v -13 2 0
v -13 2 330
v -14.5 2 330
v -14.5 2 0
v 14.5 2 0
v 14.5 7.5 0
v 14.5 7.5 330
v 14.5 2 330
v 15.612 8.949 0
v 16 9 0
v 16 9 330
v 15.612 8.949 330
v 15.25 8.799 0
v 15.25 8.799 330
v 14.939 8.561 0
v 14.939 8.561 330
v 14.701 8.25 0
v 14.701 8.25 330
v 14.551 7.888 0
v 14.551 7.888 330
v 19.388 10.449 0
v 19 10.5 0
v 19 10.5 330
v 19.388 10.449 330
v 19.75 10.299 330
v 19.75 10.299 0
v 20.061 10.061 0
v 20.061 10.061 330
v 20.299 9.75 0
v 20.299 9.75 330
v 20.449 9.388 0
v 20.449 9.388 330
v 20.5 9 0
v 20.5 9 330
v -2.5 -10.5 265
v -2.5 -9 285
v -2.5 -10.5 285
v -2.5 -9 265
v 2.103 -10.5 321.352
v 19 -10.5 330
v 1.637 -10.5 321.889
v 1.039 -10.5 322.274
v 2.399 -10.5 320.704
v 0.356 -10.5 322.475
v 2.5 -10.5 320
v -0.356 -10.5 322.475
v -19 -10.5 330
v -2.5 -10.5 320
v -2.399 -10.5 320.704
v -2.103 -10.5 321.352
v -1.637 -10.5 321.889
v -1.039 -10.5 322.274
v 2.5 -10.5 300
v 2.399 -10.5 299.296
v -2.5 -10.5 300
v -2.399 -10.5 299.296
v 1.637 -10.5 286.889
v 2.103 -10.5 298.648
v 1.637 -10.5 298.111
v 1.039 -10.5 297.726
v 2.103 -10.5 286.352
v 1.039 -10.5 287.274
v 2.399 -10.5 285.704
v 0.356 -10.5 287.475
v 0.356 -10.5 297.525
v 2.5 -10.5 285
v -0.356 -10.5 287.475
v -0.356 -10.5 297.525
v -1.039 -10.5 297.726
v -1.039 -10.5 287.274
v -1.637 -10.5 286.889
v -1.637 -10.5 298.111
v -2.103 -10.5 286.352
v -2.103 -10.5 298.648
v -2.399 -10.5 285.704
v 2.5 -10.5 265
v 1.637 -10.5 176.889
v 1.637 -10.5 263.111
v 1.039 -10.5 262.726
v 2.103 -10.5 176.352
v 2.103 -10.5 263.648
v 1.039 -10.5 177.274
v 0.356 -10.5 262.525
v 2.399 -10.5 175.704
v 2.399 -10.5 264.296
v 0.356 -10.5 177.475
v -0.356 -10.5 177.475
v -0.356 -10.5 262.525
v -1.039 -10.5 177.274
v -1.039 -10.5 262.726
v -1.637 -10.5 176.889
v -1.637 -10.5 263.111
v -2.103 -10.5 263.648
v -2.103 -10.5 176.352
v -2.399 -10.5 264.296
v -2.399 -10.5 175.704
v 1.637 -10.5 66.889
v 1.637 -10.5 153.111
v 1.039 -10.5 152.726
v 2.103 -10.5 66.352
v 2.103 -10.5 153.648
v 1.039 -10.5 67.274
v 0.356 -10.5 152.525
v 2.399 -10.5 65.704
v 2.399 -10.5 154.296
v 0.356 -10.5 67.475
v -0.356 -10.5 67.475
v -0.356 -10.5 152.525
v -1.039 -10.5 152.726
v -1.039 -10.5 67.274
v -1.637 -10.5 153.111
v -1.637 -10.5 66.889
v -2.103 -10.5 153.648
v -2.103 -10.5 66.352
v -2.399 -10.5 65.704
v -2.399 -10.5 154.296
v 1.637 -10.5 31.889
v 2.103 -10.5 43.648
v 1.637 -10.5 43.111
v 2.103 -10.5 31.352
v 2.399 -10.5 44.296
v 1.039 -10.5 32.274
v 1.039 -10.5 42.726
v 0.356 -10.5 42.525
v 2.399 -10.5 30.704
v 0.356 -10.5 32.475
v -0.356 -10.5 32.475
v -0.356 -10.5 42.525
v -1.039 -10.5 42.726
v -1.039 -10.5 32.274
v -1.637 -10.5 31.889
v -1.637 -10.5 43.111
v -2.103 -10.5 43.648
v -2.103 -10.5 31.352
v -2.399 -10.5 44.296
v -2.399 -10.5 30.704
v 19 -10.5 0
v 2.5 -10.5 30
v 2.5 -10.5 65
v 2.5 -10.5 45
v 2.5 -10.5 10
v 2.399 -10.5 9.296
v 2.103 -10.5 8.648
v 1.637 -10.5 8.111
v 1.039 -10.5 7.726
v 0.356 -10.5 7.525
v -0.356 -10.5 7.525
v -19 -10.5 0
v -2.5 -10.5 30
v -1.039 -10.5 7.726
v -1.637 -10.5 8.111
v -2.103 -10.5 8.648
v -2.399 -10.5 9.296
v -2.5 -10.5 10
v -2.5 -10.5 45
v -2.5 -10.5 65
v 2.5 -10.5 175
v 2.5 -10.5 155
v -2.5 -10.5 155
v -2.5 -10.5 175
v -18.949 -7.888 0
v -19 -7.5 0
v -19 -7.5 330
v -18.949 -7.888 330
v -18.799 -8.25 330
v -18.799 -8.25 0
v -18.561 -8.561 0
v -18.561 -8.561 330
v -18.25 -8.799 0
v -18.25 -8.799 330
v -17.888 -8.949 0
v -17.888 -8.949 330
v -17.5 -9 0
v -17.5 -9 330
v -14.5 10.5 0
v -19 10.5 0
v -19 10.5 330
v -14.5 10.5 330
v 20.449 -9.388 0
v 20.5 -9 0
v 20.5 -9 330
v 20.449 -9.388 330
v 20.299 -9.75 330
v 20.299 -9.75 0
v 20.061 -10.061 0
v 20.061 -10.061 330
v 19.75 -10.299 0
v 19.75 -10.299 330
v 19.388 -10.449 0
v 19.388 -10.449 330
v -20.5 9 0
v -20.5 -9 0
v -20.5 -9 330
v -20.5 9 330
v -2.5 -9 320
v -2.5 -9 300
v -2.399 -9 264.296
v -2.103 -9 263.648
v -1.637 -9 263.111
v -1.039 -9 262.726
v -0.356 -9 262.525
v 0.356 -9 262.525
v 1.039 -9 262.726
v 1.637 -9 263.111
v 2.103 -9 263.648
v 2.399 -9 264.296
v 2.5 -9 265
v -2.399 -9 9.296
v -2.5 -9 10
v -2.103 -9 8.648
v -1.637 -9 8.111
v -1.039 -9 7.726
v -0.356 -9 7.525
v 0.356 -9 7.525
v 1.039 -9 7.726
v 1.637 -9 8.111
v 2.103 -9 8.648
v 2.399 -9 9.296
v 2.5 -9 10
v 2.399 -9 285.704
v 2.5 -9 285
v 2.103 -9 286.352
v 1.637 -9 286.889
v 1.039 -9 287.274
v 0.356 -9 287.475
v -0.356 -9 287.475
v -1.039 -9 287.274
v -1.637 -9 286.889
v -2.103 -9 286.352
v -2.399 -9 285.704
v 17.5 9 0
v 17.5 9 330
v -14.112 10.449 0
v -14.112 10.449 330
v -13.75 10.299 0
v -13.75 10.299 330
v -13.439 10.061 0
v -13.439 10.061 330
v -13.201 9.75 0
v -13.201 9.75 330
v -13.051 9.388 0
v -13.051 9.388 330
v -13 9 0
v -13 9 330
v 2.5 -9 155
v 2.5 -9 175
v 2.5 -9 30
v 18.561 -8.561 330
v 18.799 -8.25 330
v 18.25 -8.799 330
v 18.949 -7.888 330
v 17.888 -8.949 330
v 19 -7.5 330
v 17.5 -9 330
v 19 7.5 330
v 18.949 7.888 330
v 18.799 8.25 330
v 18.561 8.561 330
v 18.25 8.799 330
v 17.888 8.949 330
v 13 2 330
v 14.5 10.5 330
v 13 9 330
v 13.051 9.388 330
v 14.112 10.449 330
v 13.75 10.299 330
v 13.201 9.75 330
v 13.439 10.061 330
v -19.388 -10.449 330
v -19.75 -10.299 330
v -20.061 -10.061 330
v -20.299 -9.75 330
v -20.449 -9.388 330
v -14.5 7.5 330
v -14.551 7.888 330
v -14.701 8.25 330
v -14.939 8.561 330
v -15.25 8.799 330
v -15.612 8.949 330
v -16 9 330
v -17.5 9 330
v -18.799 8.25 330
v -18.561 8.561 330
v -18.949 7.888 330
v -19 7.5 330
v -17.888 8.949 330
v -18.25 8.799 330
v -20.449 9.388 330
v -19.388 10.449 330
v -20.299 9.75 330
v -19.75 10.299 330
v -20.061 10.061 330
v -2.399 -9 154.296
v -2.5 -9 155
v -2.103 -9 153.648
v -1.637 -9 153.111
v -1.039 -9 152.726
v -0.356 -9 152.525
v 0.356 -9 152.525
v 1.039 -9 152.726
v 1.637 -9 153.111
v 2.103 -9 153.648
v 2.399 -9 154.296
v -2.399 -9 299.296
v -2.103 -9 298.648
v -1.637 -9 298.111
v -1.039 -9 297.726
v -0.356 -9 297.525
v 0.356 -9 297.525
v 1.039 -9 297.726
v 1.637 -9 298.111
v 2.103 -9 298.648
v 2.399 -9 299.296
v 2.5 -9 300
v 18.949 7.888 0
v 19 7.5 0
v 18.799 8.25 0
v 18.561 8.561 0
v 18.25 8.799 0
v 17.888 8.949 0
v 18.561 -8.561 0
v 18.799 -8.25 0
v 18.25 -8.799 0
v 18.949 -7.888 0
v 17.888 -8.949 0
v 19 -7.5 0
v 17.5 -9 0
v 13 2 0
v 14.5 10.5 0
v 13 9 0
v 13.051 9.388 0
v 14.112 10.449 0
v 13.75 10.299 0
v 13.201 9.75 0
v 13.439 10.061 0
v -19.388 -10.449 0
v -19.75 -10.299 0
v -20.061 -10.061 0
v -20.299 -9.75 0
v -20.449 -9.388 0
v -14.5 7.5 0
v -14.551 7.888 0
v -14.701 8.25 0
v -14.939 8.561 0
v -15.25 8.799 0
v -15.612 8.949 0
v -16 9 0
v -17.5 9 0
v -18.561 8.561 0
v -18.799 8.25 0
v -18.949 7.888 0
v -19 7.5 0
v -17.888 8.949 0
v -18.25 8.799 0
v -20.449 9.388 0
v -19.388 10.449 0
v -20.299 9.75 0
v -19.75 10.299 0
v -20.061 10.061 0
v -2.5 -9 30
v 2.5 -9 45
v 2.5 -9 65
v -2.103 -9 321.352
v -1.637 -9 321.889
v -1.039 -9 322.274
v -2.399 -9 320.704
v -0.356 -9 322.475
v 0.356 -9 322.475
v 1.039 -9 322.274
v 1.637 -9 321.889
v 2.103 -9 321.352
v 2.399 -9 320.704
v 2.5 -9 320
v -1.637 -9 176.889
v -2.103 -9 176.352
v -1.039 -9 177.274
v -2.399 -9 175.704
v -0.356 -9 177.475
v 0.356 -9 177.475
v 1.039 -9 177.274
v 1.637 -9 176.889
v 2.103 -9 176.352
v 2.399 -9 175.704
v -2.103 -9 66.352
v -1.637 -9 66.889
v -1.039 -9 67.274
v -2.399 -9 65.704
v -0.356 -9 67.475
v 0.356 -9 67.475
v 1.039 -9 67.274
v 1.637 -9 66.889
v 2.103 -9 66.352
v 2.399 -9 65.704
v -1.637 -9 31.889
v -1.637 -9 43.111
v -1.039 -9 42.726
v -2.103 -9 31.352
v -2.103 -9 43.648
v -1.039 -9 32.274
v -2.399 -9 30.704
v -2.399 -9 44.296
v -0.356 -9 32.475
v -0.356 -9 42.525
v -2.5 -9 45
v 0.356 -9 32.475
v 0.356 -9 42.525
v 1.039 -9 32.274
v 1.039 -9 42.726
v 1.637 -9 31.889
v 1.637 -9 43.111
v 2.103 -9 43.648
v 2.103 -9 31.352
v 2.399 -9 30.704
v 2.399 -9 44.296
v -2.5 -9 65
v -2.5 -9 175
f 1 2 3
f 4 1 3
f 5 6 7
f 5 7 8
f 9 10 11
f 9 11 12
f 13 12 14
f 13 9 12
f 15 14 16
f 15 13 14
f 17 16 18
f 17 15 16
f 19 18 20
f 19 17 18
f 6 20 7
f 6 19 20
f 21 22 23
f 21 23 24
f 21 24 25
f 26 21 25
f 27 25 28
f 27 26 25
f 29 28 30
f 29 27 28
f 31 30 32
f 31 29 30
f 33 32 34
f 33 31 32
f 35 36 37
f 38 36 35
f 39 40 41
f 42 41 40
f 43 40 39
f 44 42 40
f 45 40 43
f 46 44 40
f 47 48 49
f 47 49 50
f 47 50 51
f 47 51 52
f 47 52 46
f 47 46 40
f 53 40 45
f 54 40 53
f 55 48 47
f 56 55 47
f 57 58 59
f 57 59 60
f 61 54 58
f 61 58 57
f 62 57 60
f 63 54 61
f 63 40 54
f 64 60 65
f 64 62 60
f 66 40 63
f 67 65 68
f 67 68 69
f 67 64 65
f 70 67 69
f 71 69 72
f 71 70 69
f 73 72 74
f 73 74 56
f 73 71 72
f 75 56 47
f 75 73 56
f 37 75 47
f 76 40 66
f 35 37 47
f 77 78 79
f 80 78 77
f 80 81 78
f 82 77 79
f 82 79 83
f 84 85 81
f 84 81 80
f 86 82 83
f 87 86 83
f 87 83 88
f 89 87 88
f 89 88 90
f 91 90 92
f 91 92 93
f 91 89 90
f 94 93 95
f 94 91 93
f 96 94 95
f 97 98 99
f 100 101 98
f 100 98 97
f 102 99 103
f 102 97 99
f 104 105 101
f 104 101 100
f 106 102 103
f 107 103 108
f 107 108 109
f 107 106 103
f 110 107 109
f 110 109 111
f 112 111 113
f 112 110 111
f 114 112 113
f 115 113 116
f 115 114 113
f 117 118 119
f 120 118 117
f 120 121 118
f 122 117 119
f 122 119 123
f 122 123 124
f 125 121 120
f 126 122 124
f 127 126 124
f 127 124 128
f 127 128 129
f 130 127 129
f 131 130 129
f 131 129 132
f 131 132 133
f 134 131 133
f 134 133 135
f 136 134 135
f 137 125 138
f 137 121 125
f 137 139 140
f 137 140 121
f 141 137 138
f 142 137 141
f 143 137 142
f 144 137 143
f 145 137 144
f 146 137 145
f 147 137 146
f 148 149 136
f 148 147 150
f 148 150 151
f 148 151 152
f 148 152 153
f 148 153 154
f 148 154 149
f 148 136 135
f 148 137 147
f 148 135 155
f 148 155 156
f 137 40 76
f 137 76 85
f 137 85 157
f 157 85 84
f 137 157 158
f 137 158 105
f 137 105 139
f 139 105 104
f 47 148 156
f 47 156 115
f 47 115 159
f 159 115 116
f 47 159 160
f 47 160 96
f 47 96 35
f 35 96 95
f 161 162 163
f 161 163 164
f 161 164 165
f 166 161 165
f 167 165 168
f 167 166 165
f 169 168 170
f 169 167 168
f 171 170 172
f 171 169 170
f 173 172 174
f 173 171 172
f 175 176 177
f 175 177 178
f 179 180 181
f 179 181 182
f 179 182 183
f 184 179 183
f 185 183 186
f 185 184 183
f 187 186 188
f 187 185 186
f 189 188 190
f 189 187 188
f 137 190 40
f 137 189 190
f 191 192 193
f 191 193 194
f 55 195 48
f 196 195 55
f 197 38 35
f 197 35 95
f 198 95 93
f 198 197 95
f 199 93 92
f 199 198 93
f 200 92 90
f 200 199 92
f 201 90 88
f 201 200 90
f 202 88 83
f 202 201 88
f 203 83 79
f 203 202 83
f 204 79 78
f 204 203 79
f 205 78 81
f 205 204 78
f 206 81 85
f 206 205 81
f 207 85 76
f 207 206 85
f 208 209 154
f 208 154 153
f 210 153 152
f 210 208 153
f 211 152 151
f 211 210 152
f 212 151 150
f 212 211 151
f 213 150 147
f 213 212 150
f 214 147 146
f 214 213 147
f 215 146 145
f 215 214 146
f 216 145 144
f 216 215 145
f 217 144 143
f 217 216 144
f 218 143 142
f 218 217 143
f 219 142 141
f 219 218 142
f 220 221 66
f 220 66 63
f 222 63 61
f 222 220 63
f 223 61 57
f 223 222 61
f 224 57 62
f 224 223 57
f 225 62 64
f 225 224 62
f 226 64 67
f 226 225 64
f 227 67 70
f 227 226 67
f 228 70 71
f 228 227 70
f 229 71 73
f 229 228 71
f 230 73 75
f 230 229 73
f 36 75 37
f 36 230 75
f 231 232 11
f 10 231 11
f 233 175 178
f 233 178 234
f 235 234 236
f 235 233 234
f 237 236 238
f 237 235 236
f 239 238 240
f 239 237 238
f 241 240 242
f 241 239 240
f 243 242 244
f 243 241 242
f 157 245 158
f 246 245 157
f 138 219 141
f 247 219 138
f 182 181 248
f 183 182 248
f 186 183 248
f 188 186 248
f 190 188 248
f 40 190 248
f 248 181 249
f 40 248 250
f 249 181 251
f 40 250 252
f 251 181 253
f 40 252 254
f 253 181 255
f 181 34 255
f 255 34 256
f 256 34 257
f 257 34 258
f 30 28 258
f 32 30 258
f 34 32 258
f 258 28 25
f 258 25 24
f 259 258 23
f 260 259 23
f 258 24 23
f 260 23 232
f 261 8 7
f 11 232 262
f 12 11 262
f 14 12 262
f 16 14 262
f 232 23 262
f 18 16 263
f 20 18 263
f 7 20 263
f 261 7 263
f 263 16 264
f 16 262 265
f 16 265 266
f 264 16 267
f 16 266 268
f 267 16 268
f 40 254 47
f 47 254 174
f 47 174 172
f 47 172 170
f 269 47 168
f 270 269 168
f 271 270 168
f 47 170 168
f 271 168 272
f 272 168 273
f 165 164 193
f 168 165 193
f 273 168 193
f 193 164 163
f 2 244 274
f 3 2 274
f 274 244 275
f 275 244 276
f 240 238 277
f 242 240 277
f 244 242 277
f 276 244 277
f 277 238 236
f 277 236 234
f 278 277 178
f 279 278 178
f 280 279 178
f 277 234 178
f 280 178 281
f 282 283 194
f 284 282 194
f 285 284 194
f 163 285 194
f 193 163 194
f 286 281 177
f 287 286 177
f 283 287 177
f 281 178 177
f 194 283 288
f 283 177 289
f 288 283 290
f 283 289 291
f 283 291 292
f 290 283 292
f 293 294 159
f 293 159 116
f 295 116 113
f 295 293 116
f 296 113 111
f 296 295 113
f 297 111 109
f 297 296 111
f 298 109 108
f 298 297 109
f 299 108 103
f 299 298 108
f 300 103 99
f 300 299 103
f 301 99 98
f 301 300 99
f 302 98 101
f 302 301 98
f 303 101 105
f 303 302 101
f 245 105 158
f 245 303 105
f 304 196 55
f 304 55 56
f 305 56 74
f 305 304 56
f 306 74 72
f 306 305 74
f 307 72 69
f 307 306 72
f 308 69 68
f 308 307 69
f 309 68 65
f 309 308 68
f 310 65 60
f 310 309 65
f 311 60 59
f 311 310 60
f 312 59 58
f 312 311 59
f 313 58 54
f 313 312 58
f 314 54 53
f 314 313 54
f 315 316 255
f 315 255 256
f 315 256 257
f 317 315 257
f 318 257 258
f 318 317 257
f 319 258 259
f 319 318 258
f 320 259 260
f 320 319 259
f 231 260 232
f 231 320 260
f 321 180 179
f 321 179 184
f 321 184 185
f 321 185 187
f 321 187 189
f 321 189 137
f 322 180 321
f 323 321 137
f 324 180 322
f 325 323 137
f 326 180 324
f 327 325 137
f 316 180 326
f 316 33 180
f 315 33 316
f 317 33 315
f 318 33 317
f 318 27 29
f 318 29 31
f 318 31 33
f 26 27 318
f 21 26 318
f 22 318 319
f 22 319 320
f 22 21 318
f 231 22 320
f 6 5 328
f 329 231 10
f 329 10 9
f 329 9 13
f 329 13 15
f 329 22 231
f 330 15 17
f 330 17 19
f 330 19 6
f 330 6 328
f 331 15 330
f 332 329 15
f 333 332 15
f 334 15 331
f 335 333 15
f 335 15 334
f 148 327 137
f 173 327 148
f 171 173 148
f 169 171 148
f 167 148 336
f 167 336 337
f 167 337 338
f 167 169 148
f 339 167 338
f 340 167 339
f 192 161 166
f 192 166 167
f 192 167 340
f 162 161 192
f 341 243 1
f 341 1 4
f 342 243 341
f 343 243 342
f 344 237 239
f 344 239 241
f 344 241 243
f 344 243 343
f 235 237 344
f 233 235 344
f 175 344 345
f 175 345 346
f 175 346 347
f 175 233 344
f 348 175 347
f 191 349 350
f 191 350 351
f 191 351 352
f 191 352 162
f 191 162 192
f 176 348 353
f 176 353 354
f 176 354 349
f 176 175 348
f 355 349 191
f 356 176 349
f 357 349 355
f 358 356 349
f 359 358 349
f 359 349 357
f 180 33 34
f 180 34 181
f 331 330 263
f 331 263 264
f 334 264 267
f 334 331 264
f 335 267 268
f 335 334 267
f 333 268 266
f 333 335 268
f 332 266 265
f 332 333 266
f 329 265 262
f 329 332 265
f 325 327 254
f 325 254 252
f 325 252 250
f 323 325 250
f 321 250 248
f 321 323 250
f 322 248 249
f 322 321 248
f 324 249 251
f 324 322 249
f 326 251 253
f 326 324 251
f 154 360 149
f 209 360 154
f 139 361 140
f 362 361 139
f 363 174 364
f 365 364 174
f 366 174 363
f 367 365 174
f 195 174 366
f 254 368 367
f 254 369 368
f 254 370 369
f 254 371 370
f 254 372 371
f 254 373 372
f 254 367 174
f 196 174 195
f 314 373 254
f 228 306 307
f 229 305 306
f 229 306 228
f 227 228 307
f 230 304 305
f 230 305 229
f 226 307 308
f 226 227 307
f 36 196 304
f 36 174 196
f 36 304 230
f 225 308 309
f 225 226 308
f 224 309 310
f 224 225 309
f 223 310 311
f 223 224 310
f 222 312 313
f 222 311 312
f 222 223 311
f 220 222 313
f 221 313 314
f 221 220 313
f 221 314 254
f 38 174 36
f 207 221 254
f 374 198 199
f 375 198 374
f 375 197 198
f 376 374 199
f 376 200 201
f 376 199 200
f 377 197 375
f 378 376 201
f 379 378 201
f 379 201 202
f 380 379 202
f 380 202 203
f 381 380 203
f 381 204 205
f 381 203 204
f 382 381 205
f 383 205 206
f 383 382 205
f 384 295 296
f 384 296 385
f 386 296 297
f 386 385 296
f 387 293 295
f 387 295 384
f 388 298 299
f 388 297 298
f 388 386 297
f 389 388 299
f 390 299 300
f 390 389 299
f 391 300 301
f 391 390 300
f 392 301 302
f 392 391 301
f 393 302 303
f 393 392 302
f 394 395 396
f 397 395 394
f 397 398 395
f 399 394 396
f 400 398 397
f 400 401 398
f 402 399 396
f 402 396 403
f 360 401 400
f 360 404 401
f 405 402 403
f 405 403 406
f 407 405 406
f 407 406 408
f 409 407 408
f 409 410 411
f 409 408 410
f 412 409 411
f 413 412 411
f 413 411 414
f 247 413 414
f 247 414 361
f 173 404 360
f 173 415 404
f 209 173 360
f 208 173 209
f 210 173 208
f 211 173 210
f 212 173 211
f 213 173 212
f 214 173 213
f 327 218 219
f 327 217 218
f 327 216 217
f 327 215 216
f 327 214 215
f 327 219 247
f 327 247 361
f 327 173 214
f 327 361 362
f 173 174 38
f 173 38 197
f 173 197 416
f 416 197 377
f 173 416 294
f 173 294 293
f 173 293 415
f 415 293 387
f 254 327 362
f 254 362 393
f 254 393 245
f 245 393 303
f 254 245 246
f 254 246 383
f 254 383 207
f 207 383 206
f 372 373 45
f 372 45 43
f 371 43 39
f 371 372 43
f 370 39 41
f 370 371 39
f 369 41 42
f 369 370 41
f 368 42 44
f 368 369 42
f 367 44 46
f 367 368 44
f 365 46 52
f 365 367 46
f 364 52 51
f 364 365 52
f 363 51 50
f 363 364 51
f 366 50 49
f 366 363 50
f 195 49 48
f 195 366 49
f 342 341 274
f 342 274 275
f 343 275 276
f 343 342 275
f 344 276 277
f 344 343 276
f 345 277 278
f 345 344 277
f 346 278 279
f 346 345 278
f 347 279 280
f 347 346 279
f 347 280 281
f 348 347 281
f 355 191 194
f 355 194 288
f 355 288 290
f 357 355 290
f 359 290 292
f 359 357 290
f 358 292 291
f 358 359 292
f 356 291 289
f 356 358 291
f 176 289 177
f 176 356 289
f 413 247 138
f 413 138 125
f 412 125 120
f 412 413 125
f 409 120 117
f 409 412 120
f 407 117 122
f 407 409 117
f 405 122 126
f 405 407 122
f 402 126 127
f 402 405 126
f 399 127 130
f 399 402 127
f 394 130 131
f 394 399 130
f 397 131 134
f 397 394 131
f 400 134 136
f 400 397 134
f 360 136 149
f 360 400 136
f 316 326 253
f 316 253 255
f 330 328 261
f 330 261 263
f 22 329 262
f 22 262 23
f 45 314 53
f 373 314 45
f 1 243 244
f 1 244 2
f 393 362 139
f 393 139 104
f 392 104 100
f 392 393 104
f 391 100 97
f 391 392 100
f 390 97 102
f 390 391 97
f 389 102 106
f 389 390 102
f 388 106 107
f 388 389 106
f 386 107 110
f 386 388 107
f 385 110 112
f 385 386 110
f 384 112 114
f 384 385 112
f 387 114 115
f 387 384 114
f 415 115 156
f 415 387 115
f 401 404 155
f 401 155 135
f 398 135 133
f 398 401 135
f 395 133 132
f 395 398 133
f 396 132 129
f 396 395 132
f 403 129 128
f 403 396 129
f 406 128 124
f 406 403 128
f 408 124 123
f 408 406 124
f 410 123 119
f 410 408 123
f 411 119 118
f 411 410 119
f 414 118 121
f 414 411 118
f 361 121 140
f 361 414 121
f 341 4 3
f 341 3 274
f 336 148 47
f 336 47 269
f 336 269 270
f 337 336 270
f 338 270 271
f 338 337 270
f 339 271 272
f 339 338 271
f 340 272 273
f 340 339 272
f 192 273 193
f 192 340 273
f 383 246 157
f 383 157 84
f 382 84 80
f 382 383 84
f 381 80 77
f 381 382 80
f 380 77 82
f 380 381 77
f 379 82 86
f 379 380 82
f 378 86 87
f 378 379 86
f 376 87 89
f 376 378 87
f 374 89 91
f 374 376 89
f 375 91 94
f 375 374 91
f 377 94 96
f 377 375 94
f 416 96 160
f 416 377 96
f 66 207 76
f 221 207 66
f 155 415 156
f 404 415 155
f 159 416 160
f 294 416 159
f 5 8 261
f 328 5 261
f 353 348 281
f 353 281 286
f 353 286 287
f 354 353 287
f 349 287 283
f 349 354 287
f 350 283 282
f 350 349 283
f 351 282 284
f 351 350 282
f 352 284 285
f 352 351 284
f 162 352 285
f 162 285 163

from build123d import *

# Parameters (mm, degrees)
EXTRUDE_1_DEPTH     = 330
CUT_EXTRUDE_1_DEPTH = 331.802811354


with BuildPart() as part:
    # 草图1 → 凸台-拉伸1 (new body)
    with BuildSketch(Plane.XY):
        with BuildLine():
            Line((-19, 10.5), (-14.5, 10.5))
            ThreePointArc((-14.5, 10.5), (-13.439339828, 10.060660172), (-13, 9))
            Line((-13, 9), (-13, 2))
            Line((-13, 2), (-14.5, 2))
            Line((-14.5, 2), (-14.5, 7.5))
            ThreePointArc((-14.5, 7.5), (-14.939339828, 8.560660172), (-16, 9))
            Line((-16, 9), (-17.5, 9))
            ThreePointArc((-17.5, 9), (-18.560660172, 8.560660172), (-19, 7.5))
            Line((-19, 7.5), (-19, -7.5))
            ThreePointArc((-19, -7.5), (-18.560660172, -8.560660172), (-17.5, -9))
            Line((-17.5, -9), (17.5, -9))
            ThreePointArc((17.5, -9), (18.560660172, -8.560660172), (19, -7.5))
            Line((19, -7.5), (19, 7.5))
            ThreePointArc((19, 7.5), (18.560660172, 8.560660172), (17.5, 9))
            Line((17.5, 9), (16, 9))
            ThreePointArc((16, 9), (14.939339828, 8.560660172), (14.5, 7.5))
            Line((14.5, 7.5), (14.5, 2))
            Line((14.5, 2), (13, 2))
            Line((13, 2), (13, 9))
            ThreePointArc((13, 9), (13.439339828, 10.060660172), (14.5, 10.5))
            Line((14.5, 10.5), (19, 10.5))
            ThreePointArc((19, 10.5), (20.060660172, 10.060660172), (20.5, 9))
            Line((20.5, 9), (20.5, -9))
            ThreePointArc((20.5, -9), (20.060660172, -10.060660172), (19, -10.5))
            Line((19, -10.5), (-19, -10.5))
            ThreePointArc((-19, -10.5), (-20.060660172, -10.060660172), (-20.5, -9))
            Line((-20.5, -9), (-20.5, 9))
            ThreePointArc((-20.5, 9), (-20.060660172, 10.060660172), (-19, 10.5))
        make_face()
    extrude(amount=EXTRUDE_1_DEPTH)

    # 草图3 → 切除-拉伸1 (cut, through all)
    with BuildSketch(Plane(origin=(0, 0, 0), x_dir=(1, 0, 0), z_dir=(0, 1, 0))):
        with BuildLine():
            Line((2.5, -10), (2.5, -30))
            ThreePointArc((2.5, -30), (0, -32.5), (-2.5, -30))
            Line((-2.5, -30), (-2.5, -10))
            ThreePointArc((-2.5, -10), (0, -7.5), (2.5, -10))
        make_face()
        with BuildLine():
            Line((2.5, -45), (2.5, -65))
            ThreePointArc((2.5, -65), (0, -67.5), (-2.5, -65))
            Line((-2.5, -65), (-2.5, -45))
            ThreePointArc((-2.5, -45), (0, -42.5), (2.5, -45))
        make_face()
        with BuildLine():
            Line((2.5, -155), (2.5, -175))
            ThreePointArc((2.5, -175), (0, -177.5), (-2.5, -175))
            Line((-2.5, -175), (-2.5, -155))
            ThreePointArc((-2.5, -155), (0, -152.5), (2.5, -155))
        make_face()
        with BuildLine():
            Line((-2.5, -320), (-2.5, -300))
            ThreePointArc((-2.5, -300), (0, -297.5), (2.5, -300))
            Line((2.5, -300), (2.5, -320))
            ThreePointArc((2.5, -320), (0, -322.5), (-2.5, -320))
        make_face()
        with BuildLine():
            Line((-2.5, -285), (-2.5, -265))
            ThreePointArc((-2.5, -265), (0, -262.5), (2.5, -265))
            Line((2.5, -265), (2.5, -285))
            ThreePointArc((2.5, -285), (0, -287.5), (-2.5, -285))
        make_face()
    extrude(amount=-CUT_EXTRUDE_1_DEPTH, mode=Mode.SUBTRACT)


solid = part.part
